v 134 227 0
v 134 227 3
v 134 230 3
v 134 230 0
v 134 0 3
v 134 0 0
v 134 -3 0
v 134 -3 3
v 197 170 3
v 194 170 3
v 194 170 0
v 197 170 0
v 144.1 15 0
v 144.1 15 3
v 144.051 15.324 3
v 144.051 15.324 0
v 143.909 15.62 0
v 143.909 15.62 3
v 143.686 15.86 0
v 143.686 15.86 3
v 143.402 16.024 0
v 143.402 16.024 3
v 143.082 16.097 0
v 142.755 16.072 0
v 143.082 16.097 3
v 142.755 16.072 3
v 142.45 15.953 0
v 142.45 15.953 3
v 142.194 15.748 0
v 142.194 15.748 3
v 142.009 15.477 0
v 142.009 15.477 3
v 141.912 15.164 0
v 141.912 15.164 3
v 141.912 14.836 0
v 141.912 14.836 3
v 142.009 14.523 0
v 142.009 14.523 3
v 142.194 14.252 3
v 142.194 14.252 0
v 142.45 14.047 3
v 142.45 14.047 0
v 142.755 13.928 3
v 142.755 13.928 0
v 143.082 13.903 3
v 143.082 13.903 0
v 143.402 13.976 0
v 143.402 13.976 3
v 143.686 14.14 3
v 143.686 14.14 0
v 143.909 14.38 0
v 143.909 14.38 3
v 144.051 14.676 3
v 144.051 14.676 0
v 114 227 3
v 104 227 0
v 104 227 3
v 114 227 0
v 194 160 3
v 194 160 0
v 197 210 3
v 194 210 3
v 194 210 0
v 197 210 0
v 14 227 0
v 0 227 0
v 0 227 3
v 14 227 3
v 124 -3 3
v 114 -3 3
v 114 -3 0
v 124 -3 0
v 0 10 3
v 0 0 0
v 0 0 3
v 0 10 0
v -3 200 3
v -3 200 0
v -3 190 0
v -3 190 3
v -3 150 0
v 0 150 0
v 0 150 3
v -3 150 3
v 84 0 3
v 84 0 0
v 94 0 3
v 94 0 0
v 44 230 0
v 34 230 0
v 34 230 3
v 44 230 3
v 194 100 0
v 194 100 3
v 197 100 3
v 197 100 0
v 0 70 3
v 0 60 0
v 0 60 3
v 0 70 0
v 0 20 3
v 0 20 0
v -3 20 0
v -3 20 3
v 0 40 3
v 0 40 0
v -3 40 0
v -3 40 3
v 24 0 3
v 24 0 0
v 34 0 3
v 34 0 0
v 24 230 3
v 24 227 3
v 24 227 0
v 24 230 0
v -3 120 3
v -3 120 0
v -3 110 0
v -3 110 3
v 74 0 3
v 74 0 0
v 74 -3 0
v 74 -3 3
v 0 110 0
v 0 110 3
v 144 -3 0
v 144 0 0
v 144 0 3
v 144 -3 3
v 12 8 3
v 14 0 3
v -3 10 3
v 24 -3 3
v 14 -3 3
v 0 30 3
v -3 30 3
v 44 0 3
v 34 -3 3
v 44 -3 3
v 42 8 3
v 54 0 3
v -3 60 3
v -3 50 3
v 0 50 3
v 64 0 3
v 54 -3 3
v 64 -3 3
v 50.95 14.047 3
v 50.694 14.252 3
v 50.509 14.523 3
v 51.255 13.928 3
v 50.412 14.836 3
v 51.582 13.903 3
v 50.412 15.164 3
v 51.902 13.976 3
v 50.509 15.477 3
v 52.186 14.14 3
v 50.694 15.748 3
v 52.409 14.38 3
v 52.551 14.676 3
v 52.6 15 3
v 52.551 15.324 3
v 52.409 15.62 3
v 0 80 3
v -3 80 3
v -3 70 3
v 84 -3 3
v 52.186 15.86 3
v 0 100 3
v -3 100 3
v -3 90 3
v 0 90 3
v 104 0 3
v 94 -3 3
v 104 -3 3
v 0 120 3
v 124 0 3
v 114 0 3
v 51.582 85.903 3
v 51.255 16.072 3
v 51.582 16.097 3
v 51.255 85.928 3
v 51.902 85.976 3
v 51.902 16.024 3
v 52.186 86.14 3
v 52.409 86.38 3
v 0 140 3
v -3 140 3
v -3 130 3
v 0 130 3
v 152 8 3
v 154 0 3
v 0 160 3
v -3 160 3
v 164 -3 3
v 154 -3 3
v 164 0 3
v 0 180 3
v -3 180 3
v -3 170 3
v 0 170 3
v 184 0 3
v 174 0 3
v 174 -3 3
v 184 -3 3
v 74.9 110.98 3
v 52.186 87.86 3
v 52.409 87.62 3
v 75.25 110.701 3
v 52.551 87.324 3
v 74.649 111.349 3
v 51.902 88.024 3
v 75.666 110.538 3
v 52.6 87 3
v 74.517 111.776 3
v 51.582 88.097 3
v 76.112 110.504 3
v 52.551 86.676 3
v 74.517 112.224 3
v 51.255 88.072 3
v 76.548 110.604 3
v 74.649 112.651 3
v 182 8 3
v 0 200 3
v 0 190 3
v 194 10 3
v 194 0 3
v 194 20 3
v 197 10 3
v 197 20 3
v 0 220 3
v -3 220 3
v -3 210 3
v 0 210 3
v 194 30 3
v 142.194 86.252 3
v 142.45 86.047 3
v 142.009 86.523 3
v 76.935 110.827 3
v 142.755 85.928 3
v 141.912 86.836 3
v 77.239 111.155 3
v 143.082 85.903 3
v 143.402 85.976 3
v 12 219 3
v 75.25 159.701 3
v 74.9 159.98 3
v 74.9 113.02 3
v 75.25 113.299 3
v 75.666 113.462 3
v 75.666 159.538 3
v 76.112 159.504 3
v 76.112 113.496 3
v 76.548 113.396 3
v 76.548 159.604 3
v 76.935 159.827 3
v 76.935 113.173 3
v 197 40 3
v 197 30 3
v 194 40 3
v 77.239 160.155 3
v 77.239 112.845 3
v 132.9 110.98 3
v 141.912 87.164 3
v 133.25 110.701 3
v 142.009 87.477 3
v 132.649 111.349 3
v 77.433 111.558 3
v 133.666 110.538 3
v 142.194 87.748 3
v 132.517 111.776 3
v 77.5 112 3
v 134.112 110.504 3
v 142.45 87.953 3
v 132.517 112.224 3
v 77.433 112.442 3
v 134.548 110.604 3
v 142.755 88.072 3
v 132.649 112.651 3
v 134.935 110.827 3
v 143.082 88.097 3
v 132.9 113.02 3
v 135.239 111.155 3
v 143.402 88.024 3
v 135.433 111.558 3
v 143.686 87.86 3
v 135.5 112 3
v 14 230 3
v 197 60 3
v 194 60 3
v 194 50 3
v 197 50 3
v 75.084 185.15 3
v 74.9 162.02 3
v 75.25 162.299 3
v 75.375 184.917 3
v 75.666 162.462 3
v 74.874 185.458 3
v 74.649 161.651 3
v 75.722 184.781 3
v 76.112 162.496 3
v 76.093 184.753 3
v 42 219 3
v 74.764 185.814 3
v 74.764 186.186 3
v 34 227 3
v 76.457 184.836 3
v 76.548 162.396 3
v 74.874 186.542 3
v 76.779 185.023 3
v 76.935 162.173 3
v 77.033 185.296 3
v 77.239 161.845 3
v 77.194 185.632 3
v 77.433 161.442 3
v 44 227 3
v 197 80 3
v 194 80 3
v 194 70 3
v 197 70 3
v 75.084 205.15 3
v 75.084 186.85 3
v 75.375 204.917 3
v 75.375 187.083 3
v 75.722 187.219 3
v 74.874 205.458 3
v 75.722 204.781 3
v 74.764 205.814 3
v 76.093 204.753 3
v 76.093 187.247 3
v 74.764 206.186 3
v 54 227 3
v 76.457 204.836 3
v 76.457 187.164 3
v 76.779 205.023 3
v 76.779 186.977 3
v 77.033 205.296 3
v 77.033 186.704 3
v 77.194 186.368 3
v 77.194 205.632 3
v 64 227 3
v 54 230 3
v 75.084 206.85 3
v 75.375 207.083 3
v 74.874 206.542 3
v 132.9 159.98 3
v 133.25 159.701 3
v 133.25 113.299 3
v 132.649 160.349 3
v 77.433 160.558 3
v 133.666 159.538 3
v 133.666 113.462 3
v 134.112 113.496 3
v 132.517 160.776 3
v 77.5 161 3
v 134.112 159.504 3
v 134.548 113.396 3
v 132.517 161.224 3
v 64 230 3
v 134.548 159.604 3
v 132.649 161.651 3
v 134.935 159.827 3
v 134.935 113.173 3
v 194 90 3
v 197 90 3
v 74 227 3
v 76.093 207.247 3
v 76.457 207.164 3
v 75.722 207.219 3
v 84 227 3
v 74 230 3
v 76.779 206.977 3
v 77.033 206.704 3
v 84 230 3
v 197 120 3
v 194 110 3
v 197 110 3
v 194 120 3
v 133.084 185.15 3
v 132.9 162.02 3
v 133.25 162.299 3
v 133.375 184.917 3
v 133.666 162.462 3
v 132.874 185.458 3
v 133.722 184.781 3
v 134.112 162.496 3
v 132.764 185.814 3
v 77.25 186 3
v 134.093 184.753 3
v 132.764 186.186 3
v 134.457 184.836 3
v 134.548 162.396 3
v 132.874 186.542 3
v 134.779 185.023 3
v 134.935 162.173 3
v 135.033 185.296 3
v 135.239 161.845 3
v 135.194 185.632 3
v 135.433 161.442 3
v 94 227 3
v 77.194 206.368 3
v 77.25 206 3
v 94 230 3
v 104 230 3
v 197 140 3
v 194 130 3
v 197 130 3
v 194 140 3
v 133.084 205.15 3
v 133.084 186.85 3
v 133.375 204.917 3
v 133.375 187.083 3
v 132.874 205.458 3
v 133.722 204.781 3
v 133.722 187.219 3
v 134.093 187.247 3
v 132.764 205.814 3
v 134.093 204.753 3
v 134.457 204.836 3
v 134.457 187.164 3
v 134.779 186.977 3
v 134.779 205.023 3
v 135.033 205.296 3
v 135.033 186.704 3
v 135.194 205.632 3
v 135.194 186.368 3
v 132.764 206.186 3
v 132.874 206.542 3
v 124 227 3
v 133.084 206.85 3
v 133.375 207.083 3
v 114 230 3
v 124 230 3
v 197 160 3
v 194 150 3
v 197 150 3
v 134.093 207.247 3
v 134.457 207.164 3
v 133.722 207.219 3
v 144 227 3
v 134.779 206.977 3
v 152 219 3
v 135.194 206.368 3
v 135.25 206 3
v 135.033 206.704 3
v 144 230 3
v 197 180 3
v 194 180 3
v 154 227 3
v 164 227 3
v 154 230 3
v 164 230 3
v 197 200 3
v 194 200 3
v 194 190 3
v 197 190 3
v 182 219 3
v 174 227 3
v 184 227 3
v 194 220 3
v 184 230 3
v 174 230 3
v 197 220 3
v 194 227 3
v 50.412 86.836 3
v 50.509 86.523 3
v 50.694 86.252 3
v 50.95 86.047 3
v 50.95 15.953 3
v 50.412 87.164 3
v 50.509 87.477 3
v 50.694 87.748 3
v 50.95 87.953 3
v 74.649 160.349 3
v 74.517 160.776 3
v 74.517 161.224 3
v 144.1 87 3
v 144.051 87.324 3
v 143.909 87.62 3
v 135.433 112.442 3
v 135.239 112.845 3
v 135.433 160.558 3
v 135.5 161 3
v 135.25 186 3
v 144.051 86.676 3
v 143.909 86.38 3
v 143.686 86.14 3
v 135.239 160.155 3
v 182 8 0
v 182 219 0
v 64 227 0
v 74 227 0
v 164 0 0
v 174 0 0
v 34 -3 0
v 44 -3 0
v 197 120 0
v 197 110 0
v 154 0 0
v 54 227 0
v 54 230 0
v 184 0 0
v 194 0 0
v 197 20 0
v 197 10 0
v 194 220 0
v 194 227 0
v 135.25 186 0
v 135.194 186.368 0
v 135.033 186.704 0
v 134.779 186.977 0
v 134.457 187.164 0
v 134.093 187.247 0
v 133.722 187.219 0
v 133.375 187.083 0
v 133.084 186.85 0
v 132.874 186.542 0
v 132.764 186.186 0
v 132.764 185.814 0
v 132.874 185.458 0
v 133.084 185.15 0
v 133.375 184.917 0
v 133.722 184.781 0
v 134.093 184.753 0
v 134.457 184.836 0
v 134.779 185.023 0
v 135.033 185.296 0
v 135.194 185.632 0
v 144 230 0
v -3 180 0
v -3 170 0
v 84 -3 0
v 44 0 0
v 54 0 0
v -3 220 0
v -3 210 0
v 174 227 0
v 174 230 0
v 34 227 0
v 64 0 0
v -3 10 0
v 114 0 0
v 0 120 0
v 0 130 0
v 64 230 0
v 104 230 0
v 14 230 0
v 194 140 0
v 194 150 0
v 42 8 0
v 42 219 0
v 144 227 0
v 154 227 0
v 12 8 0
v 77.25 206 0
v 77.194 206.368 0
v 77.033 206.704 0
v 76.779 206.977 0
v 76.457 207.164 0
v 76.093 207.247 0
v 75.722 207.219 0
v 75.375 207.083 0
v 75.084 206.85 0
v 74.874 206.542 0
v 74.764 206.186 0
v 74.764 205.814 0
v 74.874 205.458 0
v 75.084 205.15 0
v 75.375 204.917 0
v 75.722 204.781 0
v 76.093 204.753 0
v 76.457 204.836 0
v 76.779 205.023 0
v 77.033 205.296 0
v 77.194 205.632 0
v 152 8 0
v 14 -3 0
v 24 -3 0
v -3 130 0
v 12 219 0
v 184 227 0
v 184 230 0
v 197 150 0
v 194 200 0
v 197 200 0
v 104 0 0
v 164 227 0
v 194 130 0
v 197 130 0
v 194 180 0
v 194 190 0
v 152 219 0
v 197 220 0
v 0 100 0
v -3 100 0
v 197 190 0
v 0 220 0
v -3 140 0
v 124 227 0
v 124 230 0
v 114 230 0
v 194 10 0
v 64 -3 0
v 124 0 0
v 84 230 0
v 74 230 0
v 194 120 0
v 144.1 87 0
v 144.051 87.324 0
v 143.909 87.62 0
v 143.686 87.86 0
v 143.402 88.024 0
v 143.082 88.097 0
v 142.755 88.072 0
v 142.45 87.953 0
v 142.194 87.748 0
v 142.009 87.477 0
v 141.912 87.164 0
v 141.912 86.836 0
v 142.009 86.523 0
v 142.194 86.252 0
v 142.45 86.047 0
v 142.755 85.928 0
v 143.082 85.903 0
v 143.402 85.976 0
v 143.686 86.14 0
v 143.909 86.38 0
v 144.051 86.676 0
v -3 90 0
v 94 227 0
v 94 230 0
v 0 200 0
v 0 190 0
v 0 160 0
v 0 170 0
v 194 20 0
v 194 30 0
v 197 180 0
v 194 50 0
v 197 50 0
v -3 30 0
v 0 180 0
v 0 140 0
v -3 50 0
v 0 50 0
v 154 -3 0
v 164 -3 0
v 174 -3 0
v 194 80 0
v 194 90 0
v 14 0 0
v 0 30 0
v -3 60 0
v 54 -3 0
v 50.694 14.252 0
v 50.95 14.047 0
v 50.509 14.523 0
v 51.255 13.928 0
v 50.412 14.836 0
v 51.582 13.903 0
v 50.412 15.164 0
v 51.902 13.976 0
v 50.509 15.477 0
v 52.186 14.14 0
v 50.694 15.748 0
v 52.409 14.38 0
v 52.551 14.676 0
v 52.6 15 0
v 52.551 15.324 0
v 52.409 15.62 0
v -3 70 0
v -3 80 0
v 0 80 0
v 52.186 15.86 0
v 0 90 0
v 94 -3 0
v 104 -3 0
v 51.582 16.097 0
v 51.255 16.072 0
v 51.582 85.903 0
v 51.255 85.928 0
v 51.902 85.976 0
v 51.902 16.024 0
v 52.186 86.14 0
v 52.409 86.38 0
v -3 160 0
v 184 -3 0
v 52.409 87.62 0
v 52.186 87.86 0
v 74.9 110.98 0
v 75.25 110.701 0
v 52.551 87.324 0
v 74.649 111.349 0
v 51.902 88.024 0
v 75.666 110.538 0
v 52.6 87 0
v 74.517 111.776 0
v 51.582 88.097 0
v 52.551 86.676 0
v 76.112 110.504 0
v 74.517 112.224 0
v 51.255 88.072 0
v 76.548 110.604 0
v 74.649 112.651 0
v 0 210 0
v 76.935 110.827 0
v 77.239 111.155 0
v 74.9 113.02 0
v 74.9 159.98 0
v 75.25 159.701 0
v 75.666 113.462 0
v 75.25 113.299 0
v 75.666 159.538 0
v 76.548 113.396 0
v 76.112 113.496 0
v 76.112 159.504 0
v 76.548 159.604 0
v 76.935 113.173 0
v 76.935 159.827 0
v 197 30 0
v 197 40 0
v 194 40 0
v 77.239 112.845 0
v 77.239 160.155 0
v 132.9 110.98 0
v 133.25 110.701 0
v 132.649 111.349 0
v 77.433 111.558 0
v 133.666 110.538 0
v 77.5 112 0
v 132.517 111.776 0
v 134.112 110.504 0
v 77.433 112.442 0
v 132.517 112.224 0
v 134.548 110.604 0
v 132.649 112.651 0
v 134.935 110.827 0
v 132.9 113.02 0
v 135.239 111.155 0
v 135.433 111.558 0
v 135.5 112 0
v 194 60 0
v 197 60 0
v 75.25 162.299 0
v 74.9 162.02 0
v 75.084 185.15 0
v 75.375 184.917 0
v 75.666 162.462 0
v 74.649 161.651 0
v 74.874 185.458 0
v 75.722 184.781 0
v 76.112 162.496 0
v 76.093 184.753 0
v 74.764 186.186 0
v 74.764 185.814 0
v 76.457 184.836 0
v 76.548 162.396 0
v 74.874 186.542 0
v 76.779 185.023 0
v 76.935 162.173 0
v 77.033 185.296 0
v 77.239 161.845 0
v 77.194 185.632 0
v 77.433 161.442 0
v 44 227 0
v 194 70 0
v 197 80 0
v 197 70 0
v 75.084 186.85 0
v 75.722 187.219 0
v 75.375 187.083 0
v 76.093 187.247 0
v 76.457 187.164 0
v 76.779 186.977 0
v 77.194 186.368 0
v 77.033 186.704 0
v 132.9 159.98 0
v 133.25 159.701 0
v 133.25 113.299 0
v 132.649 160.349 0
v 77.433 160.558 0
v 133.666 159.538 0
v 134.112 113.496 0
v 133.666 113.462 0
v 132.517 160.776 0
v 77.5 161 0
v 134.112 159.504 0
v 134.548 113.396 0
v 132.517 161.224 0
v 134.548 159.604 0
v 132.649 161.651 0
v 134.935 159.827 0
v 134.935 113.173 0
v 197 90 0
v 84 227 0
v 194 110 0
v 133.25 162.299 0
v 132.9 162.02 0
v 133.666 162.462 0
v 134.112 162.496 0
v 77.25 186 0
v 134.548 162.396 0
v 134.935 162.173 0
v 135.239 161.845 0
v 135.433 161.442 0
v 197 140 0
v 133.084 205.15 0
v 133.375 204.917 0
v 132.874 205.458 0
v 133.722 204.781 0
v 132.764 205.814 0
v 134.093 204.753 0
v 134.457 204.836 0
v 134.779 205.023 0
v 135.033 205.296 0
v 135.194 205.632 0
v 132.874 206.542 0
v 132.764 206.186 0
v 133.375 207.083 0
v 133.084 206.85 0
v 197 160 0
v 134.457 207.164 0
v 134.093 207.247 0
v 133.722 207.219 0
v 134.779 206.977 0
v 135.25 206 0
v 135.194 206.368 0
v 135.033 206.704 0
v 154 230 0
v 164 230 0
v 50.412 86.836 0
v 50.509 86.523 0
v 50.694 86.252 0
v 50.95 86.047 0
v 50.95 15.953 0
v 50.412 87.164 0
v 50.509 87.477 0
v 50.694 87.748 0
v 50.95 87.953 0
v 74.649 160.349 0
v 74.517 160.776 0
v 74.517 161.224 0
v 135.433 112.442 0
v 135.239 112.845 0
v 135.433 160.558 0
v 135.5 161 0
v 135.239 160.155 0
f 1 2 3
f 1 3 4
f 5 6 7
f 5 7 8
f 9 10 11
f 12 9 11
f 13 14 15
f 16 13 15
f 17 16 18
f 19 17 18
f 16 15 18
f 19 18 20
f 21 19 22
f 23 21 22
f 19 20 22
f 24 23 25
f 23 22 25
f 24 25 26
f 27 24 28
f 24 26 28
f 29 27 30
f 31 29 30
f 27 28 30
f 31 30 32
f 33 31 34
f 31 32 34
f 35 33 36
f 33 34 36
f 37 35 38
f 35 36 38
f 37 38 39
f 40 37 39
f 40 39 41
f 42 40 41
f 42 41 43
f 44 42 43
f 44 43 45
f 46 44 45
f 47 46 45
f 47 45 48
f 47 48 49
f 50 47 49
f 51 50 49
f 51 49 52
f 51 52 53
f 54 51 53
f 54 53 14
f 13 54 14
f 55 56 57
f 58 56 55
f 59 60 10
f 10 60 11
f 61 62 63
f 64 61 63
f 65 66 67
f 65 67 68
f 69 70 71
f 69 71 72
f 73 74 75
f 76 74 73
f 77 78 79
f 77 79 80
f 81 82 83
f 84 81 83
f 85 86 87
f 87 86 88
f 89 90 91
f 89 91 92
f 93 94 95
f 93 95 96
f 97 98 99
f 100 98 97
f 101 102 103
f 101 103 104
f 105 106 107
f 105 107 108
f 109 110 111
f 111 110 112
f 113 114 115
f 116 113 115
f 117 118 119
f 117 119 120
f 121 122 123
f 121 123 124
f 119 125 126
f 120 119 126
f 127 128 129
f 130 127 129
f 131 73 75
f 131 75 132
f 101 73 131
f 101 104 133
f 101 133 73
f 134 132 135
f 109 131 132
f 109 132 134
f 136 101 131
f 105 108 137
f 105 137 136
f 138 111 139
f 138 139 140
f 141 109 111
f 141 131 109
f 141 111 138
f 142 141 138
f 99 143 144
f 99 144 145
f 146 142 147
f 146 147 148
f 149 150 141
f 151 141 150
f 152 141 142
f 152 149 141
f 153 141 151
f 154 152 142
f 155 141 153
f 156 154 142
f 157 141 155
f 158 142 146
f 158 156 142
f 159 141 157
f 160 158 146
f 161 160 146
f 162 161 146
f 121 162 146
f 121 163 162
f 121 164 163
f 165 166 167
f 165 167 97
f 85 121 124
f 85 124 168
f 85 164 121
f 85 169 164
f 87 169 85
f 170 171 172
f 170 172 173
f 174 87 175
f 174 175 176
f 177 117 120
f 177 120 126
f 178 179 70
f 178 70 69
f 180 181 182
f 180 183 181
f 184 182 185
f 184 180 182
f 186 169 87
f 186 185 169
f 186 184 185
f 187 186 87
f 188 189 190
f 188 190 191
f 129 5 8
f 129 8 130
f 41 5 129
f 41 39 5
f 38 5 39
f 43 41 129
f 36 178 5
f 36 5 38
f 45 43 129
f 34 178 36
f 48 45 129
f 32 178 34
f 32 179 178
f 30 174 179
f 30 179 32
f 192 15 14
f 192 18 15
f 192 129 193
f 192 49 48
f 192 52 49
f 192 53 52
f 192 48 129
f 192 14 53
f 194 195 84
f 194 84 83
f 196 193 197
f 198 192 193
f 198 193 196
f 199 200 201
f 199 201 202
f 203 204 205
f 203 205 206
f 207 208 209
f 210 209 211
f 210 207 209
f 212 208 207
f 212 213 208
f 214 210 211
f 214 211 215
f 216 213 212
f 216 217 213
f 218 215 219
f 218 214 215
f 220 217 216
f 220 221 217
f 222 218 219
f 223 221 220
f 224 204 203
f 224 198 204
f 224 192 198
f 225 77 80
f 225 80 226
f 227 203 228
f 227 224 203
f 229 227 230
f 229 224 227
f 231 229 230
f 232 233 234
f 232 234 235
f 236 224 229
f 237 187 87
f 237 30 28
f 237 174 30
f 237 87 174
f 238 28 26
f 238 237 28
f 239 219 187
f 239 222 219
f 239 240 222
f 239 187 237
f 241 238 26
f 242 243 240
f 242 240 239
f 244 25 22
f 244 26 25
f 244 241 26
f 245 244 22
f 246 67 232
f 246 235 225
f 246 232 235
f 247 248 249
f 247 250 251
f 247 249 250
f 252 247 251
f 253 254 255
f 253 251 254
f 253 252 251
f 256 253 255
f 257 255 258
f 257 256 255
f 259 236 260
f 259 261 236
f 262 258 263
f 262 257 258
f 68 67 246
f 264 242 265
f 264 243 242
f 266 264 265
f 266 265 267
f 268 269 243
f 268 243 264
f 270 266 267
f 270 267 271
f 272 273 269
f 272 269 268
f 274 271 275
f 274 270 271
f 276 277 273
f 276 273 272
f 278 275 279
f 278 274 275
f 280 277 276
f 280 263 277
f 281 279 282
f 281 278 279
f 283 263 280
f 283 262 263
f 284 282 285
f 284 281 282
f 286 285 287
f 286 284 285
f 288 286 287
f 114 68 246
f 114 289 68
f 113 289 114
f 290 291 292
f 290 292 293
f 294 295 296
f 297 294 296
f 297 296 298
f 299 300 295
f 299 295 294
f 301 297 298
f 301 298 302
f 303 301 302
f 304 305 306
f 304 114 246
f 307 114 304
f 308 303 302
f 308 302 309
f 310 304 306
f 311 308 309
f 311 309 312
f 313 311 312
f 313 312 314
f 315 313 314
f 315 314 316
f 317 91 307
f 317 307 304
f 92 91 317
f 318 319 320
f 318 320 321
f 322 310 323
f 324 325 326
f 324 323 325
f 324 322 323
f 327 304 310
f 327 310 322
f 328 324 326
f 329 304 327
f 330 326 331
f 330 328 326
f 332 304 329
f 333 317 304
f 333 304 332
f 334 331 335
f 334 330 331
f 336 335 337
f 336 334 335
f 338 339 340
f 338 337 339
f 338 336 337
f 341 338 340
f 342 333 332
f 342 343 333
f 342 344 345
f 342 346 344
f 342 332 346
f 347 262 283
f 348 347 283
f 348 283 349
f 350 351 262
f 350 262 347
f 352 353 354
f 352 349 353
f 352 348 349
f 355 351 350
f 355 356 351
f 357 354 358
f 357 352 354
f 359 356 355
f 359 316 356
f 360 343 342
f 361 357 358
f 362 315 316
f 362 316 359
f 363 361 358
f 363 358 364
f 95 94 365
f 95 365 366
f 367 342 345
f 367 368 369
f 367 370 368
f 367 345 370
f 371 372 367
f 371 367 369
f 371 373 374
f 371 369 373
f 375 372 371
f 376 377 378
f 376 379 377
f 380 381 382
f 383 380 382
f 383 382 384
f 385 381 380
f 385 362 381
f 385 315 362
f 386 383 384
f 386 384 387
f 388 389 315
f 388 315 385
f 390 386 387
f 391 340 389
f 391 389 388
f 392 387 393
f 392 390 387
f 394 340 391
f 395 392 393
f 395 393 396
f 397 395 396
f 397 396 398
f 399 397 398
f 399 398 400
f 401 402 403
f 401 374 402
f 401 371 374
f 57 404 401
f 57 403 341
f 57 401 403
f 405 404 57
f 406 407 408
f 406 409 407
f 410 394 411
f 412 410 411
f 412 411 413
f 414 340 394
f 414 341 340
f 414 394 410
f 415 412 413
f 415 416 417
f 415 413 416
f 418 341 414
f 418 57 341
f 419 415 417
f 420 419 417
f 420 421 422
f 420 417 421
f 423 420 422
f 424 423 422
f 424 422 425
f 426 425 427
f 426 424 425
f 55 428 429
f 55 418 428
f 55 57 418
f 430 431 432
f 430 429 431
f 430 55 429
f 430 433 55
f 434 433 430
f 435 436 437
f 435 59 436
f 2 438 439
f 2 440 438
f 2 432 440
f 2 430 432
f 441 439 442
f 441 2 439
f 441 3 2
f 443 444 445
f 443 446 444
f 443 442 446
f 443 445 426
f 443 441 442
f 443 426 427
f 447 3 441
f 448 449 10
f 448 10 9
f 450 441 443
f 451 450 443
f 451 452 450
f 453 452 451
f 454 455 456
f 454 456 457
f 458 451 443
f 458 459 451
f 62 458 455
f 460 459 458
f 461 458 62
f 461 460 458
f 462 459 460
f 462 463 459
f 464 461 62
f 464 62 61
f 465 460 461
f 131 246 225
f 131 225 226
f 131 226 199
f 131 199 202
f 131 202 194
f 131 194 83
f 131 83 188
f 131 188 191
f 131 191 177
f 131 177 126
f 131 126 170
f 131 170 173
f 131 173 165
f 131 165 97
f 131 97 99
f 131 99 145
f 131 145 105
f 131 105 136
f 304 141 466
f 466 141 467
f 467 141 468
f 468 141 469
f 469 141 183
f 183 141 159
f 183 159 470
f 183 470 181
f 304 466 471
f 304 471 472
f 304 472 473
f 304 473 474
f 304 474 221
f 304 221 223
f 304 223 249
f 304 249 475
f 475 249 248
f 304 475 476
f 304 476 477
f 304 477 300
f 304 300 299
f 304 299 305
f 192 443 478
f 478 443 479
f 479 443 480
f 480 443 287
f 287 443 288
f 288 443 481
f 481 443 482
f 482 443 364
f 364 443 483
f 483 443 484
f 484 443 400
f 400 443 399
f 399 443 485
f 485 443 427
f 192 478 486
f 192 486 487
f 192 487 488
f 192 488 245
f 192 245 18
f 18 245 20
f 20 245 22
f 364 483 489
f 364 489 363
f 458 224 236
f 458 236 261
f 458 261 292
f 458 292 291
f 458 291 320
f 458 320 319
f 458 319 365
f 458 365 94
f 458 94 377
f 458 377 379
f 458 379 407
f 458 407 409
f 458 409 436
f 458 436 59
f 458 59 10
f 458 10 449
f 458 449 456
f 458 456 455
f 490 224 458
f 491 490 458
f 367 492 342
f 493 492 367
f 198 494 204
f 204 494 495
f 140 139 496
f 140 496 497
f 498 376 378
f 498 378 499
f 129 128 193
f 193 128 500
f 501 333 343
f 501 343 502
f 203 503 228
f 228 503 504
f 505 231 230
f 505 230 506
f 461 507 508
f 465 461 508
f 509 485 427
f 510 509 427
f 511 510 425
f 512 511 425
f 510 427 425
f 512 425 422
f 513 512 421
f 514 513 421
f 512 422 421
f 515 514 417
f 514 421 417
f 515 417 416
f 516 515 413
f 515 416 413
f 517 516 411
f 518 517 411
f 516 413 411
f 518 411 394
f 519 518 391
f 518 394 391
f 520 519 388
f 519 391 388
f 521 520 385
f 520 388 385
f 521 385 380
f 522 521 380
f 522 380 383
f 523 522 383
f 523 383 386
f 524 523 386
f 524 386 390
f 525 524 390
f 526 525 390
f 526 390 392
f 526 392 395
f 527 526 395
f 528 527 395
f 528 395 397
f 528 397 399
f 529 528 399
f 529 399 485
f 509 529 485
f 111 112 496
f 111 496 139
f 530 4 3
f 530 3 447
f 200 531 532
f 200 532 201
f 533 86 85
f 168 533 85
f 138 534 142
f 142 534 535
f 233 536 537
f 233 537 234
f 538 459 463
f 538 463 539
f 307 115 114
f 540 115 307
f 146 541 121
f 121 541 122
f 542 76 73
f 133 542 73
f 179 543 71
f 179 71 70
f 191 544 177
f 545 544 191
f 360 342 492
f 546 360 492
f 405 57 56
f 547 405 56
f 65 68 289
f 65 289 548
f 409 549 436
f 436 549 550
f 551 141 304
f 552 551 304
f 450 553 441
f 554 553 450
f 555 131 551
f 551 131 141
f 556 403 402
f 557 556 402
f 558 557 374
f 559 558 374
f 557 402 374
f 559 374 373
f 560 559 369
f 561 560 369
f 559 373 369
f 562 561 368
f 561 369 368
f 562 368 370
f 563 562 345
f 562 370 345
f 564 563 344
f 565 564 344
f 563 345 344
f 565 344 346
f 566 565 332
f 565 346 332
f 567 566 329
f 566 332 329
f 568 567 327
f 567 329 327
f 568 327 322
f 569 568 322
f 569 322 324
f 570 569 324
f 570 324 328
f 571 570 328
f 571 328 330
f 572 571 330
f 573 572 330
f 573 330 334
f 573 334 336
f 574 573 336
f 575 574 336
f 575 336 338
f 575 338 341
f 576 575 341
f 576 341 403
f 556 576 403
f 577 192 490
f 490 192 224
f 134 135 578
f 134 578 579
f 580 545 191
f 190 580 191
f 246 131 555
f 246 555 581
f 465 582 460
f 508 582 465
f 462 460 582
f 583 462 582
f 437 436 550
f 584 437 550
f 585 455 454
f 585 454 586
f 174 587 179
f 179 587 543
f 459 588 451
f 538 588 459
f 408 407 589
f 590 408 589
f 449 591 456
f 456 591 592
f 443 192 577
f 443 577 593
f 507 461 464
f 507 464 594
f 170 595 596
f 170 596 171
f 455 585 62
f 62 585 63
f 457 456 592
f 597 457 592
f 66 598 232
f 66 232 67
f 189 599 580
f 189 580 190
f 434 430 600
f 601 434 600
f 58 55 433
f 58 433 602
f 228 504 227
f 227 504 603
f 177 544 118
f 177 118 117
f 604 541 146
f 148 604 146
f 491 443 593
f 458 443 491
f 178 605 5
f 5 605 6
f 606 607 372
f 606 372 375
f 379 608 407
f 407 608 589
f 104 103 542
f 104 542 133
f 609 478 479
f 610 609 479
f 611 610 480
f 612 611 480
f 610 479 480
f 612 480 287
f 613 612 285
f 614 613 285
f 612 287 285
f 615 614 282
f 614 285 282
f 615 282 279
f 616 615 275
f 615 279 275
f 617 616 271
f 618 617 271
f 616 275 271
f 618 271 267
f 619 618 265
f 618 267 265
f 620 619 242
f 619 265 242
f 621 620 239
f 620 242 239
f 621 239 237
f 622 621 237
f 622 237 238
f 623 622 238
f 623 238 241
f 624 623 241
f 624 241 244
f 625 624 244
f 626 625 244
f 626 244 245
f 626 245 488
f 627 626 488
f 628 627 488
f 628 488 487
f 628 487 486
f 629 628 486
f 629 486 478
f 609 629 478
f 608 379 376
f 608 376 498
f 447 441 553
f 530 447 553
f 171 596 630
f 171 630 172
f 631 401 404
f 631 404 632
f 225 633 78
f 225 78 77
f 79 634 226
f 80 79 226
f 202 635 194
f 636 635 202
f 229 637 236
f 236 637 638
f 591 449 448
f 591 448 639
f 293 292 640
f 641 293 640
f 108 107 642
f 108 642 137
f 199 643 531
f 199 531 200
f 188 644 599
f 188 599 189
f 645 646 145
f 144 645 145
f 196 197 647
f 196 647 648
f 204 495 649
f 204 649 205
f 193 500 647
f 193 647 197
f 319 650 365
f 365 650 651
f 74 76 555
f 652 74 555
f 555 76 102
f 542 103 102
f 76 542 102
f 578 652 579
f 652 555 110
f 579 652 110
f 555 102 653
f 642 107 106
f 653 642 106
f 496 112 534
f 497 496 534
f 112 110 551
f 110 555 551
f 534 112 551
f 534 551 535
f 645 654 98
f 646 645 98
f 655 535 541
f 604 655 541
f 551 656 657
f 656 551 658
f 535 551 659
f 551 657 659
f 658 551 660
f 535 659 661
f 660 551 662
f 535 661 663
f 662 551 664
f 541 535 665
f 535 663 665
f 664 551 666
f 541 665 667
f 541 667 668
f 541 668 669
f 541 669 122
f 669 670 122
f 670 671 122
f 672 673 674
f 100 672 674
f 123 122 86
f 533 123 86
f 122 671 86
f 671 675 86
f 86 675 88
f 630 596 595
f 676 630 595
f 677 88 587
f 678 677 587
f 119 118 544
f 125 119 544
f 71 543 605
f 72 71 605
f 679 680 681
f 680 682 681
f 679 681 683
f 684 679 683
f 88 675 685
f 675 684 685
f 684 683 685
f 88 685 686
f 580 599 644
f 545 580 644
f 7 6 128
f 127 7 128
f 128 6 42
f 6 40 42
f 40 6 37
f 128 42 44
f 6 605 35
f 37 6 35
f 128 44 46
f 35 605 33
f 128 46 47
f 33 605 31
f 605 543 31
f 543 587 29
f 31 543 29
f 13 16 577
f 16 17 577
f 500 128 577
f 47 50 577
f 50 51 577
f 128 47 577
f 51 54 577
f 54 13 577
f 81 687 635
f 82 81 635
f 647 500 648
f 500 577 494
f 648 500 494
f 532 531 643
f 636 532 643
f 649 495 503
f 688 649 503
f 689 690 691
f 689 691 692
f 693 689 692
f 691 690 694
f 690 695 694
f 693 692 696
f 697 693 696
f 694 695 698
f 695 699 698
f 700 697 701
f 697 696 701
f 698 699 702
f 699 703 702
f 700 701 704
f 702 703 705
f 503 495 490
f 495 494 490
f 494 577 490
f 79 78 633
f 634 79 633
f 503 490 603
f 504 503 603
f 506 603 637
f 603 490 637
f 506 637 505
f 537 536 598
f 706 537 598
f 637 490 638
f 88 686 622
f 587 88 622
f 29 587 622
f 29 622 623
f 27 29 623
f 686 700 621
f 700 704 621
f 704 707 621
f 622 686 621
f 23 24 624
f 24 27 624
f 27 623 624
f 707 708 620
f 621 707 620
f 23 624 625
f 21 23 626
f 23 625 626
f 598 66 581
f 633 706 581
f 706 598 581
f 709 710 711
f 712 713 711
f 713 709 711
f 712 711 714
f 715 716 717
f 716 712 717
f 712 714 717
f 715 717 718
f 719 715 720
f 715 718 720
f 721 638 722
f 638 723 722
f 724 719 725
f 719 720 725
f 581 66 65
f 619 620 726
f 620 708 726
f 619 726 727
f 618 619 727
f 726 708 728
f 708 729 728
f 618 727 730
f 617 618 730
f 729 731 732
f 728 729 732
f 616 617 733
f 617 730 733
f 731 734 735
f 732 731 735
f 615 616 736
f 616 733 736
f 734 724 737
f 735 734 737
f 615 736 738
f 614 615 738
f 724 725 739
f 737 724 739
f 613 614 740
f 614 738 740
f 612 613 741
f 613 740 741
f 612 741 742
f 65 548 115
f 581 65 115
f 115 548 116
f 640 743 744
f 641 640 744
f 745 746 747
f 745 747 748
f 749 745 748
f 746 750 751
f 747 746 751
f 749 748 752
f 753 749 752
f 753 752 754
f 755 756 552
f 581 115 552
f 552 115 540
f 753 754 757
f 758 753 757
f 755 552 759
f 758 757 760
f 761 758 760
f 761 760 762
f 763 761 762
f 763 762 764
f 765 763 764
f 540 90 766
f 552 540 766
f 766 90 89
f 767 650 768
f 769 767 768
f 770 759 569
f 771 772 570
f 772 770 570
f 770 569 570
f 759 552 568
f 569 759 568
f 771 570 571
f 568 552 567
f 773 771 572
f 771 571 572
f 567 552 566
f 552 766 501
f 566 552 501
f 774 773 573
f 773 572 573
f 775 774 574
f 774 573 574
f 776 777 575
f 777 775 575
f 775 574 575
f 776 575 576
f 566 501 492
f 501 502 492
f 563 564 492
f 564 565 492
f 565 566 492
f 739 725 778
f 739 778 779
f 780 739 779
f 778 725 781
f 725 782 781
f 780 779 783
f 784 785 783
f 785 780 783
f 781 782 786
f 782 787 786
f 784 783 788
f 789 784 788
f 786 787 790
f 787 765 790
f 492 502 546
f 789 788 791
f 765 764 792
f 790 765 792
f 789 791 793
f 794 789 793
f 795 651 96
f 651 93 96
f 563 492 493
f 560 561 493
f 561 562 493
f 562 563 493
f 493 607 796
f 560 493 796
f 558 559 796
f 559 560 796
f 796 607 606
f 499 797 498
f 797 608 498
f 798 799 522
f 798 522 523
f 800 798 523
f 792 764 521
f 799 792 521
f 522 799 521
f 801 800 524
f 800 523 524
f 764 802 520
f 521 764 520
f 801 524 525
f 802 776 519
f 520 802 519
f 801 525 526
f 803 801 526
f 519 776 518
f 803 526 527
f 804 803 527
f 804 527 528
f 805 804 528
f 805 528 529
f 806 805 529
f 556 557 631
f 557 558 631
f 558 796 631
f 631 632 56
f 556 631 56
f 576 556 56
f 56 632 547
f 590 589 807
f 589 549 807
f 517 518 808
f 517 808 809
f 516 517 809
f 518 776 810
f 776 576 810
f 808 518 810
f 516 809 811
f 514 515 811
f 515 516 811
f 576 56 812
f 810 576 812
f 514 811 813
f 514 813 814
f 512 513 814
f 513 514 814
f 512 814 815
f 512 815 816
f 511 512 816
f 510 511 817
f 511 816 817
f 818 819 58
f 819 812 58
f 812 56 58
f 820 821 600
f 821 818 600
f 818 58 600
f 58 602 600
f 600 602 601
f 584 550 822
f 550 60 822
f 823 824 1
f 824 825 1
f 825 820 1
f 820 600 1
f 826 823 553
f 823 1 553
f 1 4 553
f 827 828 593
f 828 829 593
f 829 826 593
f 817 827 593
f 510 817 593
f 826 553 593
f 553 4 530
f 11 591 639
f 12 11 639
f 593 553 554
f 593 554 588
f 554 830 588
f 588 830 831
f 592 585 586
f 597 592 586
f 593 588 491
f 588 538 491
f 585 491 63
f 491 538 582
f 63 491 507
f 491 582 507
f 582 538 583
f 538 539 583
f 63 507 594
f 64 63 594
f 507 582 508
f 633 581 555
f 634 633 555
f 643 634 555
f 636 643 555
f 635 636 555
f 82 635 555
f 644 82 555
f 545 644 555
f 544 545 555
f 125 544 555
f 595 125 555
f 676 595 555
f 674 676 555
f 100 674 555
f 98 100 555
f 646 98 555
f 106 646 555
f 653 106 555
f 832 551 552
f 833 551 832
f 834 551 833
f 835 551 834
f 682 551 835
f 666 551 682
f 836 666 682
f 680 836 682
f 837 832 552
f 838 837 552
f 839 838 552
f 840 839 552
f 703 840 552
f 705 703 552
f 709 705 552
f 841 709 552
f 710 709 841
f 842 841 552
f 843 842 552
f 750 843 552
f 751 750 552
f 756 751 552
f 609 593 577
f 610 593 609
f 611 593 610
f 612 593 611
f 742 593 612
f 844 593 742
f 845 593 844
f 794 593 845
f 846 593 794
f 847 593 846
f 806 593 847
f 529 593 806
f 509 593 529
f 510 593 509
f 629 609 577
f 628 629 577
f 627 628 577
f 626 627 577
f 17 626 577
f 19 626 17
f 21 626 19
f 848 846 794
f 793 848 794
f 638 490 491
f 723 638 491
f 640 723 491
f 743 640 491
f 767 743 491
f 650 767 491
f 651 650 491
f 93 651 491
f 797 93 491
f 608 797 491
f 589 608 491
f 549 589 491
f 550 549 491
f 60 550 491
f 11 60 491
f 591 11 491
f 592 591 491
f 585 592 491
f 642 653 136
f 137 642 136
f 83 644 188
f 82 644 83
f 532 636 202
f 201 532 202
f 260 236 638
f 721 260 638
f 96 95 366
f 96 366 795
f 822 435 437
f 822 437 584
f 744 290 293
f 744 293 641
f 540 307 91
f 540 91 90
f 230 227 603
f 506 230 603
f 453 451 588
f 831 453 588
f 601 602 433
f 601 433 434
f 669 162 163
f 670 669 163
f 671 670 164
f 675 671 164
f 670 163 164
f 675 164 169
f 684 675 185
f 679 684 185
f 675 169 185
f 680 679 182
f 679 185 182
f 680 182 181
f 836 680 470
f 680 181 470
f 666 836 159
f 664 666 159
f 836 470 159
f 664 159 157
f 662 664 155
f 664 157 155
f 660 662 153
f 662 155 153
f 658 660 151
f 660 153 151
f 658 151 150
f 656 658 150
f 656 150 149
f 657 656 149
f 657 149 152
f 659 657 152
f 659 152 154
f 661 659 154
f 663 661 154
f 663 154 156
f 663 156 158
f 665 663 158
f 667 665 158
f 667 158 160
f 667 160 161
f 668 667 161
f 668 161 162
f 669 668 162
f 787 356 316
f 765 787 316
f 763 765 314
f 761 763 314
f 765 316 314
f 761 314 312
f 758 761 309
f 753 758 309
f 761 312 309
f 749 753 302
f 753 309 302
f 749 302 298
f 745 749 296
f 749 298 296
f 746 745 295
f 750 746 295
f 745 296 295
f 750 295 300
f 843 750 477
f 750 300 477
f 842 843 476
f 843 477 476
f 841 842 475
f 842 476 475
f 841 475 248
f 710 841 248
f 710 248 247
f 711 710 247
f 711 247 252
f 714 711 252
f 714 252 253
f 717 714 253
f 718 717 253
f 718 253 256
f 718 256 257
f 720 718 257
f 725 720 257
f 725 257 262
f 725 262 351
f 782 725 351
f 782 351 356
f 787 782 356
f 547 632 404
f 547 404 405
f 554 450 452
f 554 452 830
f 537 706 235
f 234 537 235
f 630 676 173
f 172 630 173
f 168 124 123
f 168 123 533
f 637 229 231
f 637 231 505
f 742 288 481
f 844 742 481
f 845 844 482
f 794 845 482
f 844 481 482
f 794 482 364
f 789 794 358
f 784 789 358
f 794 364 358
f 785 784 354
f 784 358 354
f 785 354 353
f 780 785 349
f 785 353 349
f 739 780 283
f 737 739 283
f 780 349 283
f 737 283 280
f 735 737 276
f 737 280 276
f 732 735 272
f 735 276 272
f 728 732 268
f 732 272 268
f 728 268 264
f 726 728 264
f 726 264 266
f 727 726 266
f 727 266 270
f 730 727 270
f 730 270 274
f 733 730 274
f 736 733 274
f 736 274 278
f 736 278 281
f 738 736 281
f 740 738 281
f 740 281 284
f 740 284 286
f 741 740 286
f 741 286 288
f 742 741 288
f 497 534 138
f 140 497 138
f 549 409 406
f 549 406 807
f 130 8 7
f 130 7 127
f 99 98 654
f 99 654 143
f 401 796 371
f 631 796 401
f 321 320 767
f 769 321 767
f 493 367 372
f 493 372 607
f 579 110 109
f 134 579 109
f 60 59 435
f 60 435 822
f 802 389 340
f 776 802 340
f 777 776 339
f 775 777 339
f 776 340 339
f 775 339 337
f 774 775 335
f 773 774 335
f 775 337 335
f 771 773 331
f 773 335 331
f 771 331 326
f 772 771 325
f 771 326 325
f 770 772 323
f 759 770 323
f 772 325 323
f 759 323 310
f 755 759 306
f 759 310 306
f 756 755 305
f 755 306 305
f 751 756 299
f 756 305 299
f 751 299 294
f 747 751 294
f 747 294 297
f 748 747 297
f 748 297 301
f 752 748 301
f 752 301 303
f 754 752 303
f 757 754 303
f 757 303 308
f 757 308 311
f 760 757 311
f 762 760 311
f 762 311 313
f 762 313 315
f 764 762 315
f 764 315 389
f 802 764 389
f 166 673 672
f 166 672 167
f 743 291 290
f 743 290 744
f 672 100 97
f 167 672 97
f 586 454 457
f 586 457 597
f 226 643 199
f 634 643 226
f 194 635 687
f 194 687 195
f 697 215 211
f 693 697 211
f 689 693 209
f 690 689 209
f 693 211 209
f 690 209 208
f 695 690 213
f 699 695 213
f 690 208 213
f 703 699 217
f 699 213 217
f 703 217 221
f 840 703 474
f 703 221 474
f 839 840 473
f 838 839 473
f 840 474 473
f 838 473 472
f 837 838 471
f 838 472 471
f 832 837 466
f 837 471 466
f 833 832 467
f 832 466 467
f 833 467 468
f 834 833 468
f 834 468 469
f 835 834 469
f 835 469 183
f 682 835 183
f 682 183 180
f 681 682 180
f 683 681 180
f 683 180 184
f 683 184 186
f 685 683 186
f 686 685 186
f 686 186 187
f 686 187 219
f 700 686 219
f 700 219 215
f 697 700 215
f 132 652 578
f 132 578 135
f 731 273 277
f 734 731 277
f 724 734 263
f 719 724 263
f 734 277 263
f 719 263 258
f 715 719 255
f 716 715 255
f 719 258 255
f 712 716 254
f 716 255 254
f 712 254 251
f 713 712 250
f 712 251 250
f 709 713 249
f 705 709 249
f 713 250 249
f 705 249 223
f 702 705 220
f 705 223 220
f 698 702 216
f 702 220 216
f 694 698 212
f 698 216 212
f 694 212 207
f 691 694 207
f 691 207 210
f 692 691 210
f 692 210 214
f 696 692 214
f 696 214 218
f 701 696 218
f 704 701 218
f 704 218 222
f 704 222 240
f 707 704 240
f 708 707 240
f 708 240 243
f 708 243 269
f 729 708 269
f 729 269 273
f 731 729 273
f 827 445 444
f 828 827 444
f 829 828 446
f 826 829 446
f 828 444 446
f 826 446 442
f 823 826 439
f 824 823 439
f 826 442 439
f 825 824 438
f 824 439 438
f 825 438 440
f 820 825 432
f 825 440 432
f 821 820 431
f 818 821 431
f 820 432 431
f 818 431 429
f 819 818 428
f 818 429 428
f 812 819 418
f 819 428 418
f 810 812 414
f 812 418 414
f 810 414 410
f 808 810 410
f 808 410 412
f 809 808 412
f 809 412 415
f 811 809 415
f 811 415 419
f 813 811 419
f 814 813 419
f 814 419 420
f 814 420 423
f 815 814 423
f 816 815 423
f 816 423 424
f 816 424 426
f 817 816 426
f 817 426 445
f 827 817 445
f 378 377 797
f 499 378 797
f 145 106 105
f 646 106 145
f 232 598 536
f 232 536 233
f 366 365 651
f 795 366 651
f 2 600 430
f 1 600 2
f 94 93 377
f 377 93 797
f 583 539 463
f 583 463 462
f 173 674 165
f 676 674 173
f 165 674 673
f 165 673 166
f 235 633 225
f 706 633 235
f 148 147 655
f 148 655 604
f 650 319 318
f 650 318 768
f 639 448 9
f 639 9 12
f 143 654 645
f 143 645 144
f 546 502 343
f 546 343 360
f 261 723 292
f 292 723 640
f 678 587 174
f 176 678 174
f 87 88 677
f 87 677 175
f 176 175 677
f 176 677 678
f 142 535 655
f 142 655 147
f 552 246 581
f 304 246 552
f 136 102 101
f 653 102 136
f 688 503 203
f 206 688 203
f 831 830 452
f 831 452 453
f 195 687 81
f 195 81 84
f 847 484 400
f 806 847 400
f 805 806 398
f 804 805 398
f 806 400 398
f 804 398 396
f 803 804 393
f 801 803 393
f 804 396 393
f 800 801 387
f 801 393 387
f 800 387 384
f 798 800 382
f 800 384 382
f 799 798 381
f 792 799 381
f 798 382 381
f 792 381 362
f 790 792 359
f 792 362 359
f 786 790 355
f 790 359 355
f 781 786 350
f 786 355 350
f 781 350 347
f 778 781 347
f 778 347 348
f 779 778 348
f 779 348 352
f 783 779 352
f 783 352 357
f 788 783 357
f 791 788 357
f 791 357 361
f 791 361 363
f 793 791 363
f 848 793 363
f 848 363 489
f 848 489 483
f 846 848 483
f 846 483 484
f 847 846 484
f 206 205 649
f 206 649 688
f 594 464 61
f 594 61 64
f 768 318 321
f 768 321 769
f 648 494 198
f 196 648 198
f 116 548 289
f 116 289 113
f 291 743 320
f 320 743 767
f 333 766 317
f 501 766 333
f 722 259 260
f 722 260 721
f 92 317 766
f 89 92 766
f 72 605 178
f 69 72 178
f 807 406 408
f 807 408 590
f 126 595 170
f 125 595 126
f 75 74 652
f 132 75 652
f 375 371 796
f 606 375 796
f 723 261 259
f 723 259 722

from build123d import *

# Parameters (mm, degrees)
SKETCH1_W           = 194
SKETCH1_H           = 227
BOSS_EXTRUDE1_DEPTH = 3
SKETCH2_W           = 3
SKETCH2_H           = 10
BOSS_EXTRUDE2_DEPTH = 3
LPATTERN1_COUNT     = 11
LPATTERN1_PITCH     = 20
SKETCH4_W           = 3
SKETCH4_H           = 10
BOSS_EXTRUDE3_DEPTH = 3
LPATTERN2_COUNT     = 11
LPATTERN2_PITCH     = 20
SKETCH5_W           = 10
SKETCH5_H           = 3
BOSS_EXTRUDE4_DEPTH = 3
LPATTERN3_COUNT     = 9
LPATTERN3_PITCH     = 20
SKETCH6_W           = 10
SKETCH6_H           = 3
BOSS_EXTRUDE5_DEPTH = 3
LPATTERN4_COUNT     = 9
LPATTERN4_PITCH     = 20
SKETCH7_W           = 30
SKETCH7_H           = 211
CUT_EXTRUDE1_DEPTH  = 4
SKETCH8_R           = 1.1
SKETCH8_R_2         = 1.5
SKETCH8_R_3         = 1.25
SKETCH8_W           = 30
SKETCH8_H           = 211
CUT_EXTRUDE2_DEPTH  = 4


with BuildPart() as part:
    # Sketch1 → Boss-Extrude1 (new body)
    with BuildSketch(Plane.XY):
        with Locations((97, 113.5)):
            Rectangle(SKETCH1_W, SKETCH1_H)
    extrude(amount=BOSS_EXTRUDE1_DEPTH)

    # Sketch2 → Boss-Extrude2 (add)
    with BuildSketch(Plane(origin=(194, 0, 0), x_dir=(0, 0, -1), z_dir=(1, 0, 0))):
        with Locations((-1.5, 15)):
            Rectangle(SKETCH2_W, SKETCH2_H)
    boss_extrude2 = extrude(amount=BOSS_EXTRUDE2_DEPTH)

    # LPattern1: Boss-Extrude2 ×11
    with Locations(*[(0, i * LPATTERN1_PITCH, 0) for i in range(1, LPATTERN1_COUNT)]):
        add(boss_extrude2)

    # Sketch4 → Boss-Extrude3 (add)
    with BuildSketch(Plane.ZY):
        with Locations((1.5, 15)):
            Rectangle(SKETCH4_W, SKETCH4_H)
    boss_extrude3 = extrude(amount=BOSS_EXTRUDE3_DEPTH)

    # LPattern2: Boss-Extrude3 ×11
    with Locations(*[(0, i * LPATTERN2_PITCH, 0) for i in range(1, LPATTERN2_COUNT)]):
        add(boss_extrude3)

    # Sketch5 → Boss-Extrude4 (add)
    with BuildSketch(Plane.XZ):
        with Locations((179, 1.5)):
            Rectangle(SKETCH5_W, SKETCH5_H)
    boss_extrude4 = extrude(amount=BOSS_EXTRUDE4_DEPTH)

    # LPattern3: Boss-Extrude4 ×9
    with Locations(*[(-i * LPATTERN3_PITCH, 0, 0) for i in range(1, LPATTERN3_COUNT)]):
        add(boss_extrude4)

    # Sketch6 → Boss-Extrude5 (add)
    with BuildSketch(Plane(origin=(0, 227, 0), x_dir=(1, 0, 0), z_dir=(0, 1, 0))):
        with Locations((179, -1.5)):
            Rectangle(SKETCH6_W, SKETCH6_H)
    boss_extrude5 = extrude(amount=BOSS_EXTRUDE5_DEPTH)

    # LPattern4: Boss-Extrude5 ×9
    with Locations(*[(-i * LPATTERN4_PITCH, 0, 0) for i in range(1, LPATTERN4_COUNT)]):
        add(boss_extrude5)

    # Sketch7 → Cut-Extrude1 (cut, through all)
    with BuildSketch(Plane.XY.offset(3)):
        with Locations((27, 113.5)):
            Rectangle(SKETCH7_W, SKETCH7_H)
    extrude(amount=-CUT_EXTRUDE1_DEPTH, mode=Mode.SUBTRACT)

    # Sketch8 → Cut-Extrude2 (cut, through all)
    with BuildSketch(Plane.XY.offset(3)):
        with Locations((143, 15)):
            Circle(SKETCH8_R)
        with Locations((51.5, 15)):
            Circle(SKETCH8_R)
        with Locations((143, 87)):
            Circle(SKETCH8_R)
        with Locations((51.5, 87)):
            Circle(SKETCH8_R)
        with Locations((134, 112)):
            Circle(SKETCH8_R_2)
        with Locations((76, 112)):
            Circle(SKETCH8_R_2)
        with Locations((134, 161)):
            Circle(SKETCH8_R_2)
        with Locations((76, 161)):
            Circle(SKETCH8_R_2)
        with Locations((76, 186)):
            Circle(SKETCH8_R_3)
        with Locations((76, 206)):
            Circle(SKETCH8_R_3)
        with Locations((134, 186)):
            Circle(SKETCH8_R_3)
        with Locations((134, 206)):
            Circle(SKETCH8_R_3)
        with Locations((167, 113.5)):
            Rectangle(SKETCH8_W, SKETCH8_H)
    extrude(amount=-CUT_EXTRUDE2_DEPTH, mode=Mode.SUBTRACT)


solid = part.part
